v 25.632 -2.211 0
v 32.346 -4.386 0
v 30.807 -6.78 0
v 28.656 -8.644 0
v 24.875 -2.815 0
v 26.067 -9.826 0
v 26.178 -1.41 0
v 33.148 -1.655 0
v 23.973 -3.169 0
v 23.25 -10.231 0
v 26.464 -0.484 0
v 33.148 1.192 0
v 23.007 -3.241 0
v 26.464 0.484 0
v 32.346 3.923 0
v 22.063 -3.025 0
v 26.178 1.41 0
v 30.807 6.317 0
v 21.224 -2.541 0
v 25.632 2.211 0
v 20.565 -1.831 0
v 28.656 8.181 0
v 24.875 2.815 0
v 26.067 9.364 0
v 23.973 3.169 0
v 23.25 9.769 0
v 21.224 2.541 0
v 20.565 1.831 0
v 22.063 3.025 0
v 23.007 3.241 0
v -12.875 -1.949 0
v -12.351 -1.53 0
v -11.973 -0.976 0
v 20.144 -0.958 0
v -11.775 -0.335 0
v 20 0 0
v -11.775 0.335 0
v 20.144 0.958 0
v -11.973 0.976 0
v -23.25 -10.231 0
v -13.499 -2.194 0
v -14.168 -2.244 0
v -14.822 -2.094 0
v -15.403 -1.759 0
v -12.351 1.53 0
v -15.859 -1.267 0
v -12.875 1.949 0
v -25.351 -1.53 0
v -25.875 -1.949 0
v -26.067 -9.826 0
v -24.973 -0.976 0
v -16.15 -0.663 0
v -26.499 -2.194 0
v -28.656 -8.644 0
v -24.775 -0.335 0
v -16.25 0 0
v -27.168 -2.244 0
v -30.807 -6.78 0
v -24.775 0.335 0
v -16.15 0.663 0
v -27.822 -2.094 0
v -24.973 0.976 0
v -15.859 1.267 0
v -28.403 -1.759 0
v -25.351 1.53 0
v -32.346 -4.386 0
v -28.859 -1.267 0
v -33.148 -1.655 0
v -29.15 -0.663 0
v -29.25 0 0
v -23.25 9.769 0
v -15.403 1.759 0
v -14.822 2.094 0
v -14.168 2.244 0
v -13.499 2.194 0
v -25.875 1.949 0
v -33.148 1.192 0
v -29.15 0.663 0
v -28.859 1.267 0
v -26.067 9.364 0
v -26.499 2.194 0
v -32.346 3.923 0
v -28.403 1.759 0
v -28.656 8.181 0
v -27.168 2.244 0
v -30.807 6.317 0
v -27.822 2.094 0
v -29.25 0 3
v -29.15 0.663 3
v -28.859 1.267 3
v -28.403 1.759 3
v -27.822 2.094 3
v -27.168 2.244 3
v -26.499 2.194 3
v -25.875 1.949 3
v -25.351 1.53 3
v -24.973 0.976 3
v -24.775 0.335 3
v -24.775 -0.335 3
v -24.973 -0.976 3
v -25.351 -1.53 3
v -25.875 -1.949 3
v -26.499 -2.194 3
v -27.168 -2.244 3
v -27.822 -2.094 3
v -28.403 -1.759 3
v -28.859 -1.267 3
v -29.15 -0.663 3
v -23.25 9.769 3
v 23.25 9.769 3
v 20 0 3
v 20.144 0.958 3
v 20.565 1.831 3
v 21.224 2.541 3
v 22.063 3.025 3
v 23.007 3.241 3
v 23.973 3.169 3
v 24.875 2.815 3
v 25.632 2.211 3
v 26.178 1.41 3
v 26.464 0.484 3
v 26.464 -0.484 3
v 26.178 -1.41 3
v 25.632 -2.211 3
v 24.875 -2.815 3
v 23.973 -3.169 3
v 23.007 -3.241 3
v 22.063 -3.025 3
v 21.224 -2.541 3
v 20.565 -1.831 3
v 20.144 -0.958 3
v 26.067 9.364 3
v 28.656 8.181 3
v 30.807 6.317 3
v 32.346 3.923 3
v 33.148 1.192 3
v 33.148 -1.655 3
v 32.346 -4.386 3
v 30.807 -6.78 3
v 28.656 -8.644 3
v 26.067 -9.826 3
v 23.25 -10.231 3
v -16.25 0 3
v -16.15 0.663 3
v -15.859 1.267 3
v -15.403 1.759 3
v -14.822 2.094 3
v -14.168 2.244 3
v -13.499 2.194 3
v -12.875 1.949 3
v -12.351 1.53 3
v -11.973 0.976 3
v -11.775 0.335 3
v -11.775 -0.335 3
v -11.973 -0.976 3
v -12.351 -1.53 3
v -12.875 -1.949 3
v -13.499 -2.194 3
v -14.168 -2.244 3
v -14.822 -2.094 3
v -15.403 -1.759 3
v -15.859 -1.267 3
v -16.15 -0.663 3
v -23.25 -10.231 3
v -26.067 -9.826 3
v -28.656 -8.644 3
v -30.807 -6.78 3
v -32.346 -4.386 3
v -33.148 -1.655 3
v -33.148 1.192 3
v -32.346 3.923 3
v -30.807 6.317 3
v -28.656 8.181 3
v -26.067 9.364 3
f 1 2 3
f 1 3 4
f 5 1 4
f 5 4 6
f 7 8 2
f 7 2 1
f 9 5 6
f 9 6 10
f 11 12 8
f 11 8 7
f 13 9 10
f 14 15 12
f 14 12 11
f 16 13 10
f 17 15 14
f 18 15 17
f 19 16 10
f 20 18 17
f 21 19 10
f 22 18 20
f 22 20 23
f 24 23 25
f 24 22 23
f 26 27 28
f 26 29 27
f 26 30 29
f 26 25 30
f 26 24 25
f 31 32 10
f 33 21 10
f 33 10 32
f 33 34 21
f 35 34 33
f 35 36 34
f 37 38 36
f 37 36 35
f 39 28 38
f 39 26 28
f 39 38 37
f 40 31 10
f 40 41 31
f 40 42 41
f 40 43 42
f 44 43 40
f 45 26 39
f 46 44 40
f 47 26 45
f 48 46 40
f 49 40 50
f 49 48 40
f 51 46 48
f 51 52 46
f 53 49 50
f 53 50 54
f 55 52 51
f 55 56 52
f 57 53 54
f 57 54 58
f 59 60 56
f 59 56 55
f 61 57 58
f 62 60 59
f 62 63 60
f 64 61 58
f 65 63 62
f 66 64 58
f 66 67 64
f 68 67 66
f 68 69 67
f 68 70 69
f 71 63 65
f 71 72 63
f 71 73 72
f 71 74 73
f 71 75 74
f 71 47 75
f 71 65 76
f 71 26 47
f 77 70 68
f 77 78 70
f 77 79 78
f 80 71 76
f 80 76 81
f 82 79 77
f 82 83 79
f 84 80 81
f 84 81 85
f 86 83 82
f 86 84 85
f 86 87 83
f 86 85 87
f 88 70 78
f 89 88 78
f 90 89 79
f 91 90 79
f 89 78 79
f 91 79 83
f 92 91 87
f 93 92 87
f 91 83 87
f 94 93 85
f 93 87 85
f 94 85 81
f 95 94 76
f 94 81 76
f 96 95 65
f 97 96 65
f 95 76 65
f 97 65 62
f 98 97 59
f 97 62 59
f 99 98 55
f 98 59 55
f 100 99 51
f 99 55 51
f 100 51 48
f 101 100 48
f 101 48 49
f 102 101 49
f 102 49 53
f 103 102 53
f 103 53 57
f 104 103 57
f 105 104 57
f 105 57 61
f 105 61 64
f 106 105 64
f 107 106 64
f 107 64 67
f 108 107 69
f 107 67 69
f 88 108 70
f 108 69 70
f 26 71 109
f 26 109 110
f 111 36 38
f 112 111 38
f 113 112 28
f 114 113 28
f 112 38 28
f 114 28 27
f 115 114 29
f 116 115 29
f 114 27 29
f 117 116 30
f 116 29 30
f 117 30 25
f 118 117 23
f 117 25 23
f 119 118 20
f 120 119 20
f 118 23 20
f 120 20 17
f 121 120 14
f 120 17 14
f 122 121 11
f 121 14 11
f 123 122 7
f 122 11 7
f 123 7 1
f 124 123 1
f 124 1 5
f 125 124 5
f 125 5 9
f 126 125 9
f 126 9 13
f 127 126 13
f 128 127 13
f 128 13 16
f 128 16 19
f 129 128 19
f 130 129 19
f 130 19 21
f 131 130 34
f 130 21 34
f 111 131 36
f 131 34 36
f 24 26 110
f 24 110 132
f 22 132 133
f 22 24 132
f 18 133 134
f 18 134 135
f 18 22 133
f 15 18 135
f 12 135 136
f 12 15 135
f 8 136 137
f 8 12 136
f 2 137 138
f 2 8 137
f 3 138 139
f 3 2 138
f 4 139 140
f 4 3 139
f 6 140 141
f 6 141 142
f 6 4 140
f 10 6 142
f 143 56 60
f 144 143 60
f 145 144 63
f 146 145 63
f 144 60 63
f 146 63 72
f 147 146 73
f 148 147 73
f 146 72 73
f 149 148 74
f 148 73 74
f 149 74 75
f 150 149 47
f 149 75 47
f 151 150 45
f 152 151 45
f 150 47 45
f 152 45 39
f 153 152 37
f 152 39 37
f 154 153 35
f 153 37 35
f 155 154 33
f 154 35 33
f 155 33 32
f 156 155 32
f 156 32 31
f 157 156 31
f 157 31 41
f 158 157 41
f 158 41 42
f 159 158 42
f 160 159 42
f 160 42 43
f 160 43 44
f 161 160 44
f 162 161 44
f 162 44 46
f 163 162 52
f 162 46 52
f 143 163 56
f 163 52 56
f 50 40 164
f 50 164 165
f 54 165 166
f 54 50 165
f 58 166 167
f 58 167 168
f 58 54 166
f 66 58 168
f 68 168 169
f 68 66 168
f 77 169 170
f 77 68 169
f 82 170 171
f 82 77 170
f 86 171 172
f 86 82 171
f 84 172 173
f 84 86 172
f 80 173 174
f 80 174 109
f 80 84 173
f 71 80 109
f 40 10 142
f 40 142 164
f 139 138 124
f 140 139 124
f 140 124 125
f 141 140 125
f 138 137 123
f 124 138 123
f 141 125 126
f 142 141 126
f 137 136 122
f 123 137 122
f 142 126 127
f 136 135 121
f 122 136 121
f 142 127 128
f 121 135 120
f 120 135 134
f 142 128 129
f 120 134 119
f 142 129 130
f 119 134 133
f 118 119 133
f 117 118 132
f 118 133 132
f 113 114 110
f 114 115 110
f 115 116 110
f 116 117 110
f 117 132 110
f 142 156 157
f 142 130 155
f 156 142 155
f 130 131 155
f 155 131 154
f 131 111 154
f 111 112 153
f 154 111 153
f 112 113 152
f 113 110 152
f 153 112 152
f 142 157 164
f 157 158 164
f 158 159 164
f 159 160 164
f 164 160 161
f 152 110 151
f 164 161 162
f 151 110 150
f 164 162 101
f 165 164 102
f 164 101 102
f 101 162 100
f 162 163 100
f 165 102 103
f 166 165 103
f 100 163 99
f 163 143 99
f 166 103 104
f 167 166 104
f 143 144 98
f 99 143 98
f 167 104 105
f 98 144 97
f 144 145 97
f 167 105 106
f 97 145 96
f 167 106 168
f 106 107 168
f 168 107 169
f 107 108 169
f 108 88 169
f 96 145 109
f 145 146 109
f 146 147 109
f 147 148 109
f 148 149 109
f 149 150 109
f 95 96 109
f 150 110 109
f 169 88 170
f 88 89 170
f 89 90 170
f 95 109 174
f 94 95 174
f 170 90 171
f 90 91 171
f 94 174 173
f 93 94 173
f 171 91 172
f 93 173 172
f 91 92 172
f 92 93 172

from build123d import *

# Parameters (mm, degrees)
SALIENTE_EXTRUIR1_DEPTH = 3
CROQUIS2_R              = 2.25
CROQUIS2_R_2            = 3.25
CORTAR_EXTRUIR1_DEPTH   = 3


with BuildPart() as part:
    # Croquis1 → Saliente-Extruir1 (new body)
    with BuildSketch(Plane.XY):
        with BuildLine():
            Line((-23.25, 9.768613172), (23.25, 9.768613172))
            ThreePointArc((23.25, 9.768613172), (33.25, -0.231386828), (23.25, -10.231386828))
            Line((23.25, -10.231386828), (-23.25, -10.231386828))
            ThreePointArc((-23.25, -10.231386828), (-33.25, -0.231386828), (-23.25, 9.768613172))
        make_face()
    extrude(amount=SALIENTE_EXTRUIR1_DEPTH)

    # Croquis2 → Cortar-Extruir1 (cut)
    with BuildSketch(Plane(origin=(0, 0, 0), x_dir=(-1, 0, 0), z_dir=(0, 0, -1))):
        with Locations((14, 0)):
            Circle(CROQUIS2_R)
        with Locations((27, 0)):
            Circle(CROQUIS2_R)
        with Locations((-23.25, 0)):
            Circle(CROQUIS2_R_2)
    extrude(amount=-CORTAR_EXTRUIR1_DEPTH, mode=Mode.SUBTRACT)


solid = part.part
